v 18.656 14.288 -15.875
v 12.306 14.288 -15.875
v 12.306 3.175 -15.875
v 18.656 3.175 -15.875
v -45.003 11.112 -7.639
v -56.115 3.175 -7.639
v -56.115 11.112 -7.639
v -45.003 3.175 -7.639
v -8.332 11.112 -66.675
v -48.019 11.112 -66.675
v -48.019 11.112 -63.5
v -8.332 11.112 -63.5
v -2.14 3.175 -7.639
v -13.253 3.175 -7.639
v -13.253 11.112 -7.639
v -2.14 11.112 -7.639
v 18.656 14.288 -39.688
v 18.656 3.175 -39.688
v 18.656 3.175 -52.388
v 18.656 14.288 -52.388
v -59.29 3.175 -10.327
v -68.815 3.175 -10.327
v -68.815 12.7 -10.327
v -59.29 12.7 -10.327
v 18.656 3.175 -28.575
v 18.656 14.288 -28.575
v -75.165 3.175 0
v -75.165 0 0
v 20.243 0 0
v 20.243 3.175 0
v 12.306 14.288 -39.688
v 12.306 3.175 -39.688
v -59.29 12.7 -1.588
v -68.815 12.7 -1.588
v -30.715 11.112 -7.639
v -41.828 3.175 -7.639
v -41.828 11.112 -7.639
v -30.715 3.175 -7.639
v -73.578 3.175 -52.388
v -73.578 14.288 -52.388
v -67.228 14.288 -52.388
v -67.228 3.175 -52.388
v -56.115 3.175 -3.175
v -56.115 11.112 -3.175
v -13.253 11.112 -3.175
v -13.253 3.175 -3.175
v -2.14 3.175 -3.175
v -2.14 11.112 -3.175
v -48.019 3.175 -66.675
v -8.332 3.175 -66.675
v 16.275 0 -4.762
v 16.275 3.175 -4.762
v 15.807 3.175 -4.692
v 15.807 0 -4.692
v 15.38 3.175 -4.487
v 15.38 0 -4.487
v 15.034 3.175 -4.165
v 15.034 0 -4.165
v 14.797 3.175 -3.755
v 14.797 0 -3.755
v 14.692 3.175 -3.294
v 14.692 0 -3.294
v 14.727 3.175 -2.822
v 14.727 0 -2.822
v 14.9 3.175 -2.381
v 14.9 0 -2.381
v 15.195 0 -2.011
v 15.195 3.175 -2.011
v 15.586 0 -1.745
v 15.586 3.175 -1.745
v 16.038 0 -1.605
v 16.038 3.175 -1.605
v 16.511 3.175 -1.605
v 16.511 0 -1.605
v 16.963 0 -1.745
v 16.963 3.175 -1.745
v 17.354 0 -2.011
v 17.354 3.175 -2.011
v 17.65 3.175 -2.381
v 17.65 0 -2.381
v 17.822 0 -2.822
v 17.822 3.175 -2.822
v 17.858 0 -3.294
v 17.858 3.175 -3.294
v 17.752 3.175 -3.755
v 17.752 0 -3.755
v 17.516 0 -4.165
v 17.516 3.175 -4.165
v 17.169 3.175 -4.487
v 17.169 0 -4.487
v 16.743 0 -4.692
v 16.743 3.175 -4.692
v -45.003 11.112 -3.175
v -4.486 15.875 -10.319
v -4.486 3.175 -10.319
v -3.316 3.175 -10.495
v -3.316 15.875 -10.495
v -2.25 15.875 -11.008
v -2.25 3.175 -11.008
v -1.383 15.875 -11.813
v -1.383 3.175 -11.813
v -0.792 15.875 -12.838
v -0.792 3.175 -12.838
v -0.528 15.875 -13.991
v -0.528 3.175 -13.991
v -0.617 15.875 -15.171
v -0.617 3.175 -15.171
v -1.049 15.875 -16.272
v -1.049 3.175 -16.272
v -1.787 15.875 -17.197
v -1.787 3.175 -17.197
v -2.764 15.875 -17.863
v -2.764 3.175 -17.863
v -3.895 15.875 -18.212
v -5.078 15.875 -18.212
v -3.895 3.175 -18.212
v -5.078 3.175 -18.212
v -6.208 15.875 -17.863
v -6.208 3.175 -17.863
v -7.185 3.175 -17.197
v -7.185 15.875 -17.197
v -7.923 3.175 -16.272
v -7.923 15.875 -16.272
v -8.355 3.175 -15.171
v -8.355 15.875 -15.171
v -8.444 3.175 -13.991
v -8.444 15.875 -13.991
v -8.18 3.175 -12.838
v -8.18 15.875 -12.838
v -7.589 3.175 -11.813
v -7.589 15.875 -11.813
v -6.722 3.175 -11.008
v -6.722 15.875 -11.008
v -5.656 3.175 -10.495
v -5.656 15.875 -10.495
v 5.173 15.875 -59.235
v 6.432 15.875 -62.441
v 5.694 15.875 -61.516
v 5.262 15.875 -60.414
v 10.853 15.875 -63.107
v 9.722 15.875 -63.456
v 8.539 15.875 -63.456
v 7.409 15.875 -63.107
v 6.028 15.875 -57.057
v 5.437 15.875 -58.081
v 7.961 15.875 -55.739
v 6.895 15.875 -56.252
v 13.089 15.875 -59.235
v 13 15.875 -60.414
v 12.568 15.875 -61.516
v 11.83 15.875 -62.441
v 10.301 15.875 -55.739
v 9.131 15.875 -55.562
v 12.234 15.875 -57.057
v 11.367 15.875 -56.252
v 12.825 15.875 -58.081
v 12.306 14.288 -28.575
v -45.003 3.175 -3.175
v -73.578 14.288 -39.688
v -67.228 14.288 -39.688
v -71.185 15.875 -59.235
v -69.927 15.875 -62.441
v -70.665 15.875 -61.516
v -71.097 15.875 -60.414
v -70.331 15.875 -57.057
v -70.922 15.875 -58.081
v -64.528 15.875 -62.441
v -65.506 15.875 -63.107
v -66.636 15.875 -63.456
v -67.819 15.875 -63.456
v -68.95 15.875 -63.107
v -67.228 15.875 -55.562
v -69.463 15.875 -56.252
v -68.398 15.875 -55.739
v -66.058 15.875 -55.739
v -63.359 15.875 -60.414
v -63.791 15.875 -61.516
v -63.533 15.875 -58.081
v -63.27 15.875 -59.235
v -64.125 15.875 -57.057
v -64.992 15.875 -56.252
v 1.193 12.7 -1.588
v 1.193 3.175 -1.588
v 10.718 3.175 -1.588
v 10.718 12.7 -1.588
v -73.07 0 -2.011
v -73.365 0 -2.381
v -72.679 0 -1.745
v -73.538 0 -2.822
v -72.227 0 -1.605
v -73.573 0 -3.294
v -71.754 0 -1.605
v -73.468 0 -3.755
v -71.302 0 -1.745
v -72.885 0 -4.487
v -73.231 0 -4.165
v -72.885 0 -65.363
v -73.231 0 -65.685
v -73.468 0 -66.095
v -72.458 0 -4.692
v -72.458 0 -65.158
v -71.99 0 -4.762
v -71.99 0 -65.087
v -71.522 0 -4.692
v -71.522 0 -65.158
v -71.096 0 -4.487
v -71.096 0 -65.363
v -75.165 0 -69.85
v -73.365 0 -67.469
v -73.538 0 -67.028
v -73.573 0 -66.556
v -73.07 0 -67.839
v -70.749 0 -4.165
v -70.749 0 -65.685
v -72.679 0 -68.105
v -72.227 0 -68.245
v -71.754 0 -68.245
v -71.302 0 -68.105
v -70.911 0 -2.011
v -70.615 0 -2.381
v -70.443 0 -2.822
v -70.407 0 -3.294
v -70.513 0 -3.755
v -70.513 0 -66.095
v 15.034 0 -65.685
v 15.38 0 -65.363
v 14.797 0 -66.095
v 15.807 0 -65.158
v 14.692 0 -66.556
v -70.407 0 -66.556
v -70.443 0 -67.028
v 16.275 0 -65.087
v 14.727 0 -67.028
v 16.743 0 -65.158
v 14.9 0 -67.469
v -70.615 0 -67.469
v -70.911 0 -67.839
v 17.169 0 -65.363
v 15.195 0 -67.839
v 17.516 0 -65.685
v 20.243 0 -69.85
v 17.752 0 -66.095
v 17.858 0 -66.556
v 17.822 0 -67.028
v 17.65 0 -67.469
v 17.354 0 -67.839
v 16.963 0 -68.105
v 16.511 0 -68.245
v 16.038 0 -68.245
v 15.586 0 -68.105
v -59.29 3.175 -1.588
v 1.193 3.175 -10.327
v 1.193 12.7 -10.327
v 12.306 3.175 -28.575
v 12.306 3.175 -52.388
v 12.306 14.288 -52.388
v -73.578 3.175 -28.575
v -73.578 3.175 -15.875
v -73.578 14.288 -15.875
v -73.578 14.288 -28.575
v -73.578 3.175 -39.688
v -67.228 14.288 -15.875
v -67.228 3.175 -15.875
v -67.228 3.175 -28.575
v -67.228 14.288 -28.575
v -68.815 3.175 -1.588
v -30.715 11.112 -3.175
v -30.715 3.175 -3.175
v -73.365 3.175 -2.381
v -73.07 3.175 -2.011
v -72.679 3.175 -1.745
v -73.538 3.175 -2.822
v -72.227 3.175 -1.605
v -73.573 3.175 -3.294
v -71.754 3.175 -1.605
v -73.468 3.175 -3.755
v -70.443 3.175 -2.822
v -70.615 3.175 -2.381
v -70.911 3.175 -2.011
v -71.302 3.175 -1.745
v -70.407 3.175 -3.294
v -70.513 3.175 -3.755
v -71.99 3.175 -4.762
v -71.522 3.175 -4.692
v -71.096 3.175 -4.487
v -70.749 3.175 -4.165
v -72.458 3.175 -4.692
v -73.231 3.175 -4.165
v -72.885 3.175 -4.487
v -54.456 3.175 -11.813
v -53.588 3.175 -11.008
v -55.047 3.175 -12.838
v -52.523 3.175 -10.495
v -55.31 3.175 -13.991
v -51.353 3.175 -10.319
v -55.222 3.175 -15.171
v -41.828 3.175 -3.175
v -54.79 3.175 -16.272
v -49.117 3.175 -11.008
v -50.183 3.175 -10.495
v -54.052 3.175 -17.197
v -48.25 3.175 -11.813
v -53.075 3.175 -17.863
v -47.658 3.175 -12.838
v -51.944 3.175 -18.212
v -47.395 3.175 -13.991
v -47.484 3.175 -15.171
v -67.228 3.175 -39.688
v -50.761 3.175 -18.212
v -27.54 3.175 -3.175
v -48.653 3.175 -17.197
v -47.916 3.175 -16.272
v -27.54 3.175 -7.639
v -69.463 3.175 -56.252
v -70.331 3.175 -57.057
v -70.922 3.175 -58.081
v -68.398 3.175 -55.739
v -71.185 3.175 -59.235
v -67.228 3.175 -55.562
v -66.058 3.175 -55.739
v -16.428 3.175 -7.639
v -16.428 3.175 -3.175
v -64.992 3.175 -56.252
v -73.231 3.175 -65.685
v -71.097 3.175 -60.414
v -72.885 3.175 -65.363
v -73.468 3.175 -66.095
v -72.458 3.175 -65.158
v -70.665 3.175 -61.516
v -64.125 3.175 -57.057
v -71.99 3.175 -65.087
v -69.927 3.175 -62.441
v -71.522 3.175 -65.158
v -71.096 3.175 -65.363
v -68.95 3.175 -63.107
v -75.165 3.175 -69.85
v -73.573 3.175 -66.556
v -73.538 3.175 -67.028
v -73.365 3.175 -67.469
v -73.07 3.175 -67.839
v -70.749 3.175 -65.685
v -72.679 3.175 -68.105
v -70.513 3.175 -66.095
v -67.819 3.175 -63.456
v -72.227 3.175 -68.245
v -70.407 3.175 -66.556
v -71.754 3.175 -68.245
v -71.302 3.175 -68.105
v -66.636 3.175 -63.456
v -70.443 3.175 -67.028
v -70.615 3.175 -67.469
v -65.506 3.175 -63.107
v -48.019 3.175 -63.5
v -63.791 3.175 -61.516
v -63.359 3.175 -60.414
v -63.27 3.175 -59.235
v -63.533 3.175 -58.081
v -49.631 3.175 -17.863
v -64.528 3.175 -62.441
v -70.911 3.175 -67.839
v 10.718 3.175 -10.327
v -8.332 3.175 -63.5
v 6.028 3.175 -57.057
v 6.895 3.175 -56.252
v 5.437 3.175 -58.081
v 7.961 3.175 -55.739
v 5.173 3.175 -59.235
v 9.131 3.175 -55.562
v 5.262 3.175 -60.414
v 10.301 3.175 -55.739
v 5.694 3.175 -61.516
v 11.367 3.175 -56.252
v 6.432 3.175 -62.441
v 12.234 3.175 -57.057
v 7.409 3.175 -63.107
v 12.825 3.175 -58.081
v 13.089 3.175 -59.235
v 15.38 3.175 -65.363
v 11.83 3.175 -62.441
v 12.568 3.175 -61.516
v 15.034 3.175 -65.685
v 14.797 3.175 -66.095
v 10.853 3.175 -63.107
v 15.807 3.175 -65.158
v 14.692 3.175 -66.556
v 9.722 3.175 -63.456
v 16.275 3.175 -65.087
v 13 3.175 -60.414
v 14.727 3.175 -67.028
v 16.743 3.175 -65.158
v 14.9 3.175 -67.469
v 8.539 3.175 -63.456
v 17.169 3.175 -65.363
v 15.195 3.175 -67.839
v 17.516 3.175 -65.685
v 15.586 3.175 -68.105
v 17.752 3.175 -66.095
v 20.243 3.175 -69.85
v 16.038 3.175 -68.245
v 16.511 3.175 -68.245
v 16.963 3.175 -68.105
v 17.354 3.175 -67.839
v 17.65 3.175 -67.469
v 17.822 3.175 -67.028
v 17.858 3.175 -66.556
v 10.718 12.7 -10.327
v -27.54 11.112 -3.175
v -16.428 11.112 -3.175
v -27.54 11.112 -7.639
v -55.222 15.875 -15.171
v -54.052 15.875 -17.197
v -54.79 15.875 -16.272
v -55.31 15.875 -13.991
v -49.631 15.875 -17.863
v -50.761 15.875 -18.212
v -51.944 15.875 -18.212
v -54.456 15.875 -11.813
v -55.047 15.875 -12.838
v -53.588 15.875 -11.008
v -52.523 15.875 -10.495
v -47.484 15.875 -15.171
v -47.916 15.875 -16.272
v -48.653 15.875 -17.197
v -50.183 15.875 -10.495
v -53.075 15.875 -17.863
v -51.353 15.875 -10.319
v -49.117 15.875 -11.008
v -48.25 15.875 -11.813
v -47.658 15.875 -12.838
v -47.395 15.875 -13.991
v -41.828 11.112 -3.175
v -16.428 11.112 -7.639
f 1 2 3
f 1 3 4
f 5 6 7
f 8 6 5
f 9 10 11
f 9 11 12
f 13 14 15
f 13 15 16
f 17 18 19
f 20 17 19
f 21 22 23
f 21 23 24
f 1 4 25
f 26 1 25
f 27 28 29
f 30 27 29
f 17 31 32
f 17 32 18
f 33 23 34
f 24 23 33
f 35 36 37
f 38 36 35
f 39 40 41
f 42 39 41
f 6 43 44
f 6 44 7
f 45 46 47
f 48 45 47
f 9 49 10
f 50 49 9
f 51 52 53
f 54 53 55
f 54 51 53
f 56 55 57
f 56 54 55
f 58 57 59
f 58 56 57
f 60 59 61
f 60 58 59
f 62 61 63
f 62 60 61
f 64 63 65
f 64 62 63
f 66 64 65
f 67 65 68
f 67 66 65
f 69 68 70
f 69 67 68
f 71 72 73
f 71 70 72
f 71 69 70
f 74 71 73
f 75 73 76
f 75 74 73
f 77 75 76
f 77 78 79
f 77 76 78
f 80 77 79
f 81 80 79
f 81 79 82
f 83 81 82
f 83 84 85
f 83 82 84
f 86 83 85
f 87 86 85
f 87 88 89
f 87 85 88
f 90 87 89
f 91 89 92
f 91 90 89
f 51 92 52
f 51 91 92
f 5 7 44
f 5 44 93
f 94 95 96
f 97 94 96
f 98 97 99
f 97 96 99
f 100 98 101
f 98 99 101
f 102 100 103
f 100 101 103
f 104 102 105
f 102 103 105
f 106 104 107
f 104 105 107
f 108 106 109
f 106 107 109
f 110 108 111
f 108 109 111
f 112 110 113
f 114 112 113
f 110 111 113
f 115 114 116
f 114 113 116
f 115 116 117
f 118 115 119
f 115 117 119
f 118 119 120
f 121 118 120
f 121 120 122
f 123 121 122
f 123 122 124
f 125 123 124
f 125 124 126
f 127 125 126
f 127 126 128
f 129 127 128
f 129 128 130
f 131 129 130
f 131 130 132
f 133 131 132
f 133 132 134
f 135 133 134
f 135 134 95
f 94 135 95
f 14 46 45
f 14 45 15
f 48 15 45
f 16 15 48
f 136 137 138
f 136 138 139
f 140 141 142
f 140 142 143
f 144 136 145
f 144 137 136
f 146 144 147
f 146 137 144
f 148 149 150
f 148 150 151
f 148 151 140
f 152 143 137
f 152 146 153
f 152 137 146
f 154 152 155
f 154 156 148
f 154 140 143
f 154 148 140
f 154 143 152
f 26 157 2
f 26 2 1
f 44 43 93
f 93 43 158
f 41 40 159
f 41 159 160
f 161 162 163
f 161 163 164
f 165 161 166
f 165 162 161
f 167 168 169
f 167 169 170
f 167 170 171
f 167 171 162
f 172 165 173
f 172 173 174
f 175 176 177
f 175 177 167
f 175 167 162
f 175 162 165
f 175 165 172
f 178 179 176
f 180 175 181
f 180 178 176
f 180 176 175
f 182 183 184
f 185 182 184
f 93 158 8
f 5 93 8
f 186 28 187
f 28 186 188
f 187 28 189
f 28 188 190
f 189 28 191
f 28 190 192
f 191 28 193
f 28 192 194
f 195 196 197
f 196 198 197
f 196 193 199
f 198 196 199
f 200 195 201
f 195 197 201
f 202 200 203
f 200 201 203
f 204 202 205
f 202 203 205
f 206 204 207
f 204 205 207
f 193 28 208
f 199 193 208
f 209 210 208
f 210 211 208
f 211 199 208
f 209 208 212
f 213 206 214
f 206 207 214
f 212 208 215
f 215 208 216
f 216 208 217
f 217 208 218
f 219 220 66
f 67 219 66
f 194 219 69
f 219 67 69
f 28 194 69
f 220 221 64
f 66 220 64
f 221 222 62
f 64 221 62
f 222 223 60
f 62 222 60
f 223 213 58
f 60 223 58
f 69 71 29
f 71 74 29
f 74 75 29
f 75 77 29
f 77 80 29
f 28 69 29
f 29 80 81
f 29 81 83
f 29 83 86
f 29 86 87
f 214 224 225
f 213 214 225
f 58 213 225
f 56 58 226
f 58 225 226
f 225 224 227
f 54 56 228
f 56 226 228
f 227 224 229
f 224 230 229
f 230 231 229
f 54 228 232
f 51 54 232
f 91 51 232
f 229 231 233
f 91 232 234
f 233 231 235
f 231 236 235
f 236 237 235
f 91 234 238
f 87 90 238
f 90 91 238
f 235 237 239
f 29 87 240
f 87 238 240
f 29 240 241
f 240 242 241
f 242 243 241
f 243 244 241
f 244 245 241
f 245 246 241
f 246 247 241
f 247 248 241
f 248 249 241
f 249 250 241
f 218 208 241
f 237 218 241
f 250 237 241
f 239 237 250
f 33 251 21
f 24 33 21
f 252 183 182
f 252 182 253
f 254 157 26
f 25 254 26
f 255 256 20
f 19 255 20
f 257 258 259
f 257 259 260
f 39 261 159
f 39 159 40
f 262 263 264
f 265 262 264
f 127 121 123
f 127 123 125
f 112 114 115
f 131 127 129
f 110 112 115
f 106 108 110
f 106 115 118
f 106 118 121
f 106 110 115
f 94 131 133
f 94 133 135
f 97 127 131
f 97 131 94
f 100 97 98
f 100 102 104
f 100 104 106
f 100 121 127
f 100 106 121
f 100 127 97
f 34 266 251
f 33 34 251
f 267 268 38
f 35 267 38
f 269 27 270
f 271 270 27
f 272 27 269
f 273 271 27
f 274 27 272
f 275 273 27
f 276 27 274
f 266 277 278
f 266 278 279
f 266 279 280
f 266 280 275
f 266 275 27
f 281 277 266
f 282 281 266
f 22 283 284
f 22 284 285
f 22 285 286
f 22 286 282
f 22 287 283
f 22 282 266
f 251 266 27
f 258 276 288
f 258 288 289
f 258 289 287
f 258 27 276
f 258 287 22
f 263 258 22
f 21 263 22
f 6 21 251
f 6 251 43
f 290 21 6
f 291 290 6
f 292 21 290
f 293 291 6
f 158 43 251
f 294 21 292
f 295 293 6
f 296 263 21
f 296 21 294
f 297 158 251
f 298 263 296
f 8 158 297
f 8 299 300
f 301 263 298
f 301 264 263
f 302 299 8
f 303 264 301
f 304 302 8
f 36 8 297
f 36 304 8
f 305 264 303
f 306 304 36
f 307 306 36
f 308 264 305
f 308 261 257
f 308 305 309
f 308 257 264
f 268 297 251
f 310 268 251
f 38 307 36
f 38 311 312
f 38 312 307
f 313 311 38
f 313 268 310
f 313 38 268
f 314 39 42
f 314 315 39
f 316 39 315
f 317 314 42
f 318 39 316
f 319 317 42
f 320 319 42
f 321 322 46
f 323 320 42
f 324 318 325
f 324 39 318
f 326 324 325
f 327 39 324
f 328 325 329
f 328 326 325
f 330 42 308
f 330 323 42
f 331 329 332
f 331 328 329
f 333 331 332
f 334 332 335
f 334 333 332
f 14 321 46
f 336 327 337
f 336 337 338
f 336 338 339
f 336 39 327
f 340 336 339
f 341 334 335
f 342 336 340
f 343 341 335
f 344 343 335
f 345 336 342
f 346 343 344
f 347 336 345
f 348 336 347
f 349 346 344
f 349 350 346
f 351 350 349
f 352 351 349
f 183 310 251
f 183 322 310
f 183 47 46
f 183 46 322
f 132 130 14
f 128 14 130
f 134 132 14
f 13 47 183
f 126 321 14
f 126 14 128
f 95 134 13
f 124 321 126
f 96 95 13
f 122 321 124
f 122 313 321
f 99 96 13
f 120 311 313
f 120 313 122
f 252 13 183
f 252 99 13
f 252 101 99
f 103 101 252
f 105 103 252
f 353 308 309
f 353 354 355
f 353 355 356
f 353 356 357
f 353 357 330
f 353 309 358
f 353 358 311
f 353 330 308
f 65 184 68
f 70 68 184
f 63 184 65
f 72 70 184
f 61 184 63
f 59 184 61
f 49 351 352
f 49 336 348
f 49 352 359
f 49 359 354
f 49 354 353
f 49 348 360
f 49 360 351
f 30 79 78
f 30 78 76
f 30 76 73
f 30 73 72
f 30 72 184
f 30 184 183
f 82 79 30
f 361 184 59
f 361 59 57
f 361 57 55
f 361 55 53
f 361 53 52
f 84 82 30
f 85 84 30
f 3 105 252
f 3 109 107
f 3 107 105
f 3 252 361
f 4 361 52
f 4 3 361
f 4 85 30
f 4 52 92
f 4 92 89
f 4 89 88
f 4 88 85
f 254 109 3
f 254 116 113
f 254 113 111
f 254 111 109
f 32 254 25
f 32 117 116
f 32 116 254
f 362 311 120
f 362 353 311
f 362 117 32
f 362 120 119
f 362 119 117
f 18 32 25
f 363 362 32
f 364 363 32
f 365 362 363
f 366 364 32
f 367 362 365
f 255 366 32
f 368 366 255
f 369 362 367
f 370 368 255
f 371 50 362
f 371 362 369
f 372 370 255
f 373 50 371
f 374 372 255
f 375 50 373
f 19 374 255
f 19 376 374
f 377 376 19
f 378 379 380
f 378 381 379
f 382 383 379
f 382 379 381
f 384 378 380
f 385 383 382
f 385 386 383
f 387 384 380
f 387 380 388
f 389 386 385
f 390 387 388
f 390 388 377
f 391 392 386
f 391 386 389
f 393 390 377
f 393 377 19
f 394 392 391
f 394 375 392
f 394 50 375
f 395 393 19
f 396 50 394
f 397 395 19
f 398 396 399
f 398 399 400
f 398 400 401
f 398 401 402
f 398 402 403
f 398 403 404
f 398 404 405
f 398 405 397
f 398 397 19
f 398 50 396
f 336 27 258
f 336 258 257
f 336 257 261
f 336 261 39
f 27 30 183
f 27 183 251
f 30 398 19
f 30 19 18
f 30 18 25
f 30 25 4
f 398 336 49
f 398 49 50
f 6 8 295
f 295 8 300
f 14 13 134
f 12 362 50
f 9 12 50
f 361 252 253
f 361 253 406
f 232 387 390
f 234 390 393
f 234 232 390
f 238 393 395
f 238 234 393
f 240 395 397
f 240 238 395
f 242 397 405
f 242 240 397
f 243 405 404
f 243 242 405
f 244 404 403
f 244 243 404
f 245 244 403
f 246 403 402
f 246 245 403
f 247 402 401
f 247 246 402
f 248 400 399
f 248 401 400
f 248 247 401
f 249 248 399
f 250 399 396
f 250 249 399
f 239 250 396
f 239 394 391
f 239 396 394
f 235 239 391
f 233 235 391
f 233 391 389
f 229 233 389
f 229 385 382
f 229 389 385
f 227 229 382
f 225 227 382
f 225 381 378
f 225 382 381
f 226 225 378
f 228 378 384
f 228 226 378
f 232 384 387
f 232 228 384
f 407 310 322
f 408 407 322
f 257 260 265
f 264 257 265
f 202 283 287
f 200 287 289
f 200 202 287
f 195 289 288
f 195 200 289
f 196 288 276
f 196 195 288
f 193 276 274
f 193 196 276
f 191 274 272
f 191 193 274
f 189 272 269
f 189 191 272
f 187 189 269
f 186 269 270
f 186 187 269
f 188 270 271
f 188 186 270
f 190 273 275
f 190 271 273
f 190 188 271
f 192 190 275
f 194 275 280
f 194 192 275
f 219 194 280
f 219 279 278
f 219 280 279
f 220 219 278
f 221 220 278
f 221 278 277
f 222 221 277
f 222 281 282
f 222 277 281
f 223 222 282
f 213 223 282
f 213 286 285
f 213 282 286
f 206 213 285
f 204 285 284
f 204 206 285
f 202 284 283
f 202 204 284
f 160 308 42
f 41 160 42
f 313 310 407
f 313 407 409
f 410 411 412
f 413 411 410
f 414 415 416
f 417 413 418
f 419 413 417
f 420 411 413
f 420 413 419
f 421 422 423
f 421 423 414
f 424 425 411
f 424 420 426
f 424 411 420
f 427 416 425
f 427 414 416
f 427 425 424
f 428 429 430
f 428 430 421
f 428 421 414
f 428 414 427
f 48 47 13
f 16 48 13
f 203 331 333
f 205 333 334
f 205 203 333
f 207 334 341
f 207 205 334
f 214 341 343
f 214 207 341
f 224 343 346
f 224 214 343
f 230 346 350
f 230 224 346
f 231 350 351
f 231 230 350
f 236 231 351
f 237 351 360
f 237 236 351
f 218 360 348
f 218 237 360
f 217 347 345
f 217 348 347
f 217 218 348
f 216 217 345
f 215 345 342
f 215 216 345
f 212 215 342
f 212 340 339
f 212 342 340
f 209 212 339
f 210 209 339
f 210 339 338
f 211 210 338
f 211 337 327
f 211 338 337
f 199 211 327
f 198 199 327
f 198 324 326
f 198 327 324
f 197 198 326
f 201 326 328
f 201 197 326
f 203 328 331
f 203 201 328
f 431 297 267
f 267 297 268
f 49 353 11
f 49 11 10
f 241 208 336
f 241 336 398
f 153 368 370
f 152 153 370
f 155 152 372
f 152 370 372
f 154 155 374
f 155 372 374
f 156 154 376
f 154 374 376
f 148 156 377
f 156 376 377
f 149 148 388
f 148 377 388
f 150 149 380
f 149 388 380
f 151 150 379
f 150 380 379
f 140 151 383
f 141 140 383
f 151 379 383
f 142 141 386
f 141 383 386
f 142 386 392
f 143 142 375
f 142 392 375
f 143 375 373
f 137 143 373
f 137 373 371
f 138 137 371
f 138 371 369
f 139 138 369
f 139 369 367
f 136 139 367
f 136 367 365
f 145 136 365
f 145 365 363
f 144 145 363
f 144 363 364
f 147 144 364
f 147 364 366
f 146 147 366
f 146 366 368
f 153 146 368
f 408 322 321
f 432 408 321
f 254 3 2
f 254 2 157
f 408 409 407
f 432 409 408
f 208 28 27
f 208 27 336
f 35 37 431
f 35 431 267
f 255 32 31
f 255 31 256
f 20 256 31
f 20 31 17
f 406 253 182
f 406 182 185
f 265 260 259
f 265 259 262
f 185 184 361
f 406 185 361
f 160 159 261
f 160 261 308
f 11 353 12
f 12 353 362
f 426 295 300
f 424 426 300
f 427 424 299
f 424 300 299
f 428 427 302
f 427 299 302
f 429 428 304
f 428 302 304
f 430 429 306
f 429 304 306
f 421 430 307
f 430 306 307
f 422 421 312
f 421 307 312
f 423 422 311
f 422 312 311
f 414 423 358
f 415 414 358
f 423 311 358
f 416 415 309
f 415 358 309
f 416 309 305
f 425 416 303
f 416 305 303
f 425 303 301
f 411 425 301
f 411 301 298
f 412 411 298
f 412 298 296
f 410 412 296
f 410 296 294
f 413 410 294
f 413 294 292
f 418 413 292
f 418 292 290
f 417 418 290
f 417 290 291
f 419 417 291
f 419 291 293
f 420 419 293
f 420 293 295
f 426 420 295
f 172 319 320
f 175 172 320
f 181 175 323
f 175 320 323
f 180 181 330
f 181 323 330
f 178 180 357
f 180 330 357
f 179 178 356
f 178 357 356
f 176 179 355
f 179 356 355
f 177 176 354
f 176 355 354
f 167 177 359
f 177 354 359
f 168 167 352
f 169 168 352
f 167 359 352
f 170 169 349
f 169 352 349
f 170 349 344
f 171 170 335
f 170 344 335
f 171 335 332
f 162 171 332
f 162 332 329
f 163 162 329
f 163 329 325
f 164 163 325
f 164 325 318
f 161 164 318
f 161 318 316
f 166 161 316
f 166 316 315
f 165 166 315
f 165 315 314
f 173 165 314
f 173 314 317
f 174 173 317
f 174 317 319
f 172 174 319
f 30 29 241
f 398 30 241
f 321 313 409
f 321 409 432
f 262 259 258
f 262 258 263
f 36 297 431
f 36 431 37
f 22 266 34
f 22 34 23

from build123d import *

# Parameters (mm, degrees)
SKETCH1_W           = 95.40875
SKETCH1_H           = 69.85
BOSS_EXTRUDE1_DEPTH = 3.175
SKETCH1_4_R         = 3.96875
BOSS_EXTRUDE2_DEPTH = 15.875
SKETCH1_5_W         = 6.35
SKETCH1_5_H         = 12.7
BOSS_EXTRUDE3_DEPTH = 14.2875
SKETCH1_6_W         = 39.6875
SKETCH1_6_H         = 3.175
BOSS_EXTRUDE4_DEPTH = 11.1125
SKETCH1_8_R         = 1.5875
CUT_EXTRUDE4_DEPTH  = 104.830931221
SKETCH1_9_W         = 11.1125
SKETCH1_9_H         = 4.464487979
BOSS_EXTRUDE5_DEPTH = 11.1125
SKETCH1_10_W        = 9.525
SKETCH1_10_H        = 8.739789678
BOSS_EXTRUDE6_DEPTH = 12.7


with BuildPart() as part:
    # Sketch1 → Boss-Extrude1 (new body)
    with BuildSketch(Plane(origin=(0, 0, 0), x_dir=(1, 0, 0), z_dir=(0, 1, 0))):
        with Locations((-27.460937167, 34.925)):
            Rectangle(SKETCH1_W, SKETCH1_H)
    extrude(amount=BOSS_EXTRUDE1_DEPTH)

    # Sketch1<4> → Boss-Extrude2 (add)
    with BuildSketch(Plane(origin=(0, 0, 0), x_dir=(1, 0, 0), z_dir=(0, 1, 0))):
        with Locations(Location((-51.352812167, 14.2875, 0), (0, 0, 270))):
            Circle(SKETCH1_4_R)
        with Locations(Location((-4.486033595, 14.2875, 0), (0, 0, 270))):
            Circle(SKETCH1_4_R)
        with Locations(Location((9.130937833, 59.53125, 0), (0, 0, 270))):
            Circle(SKETCH1_4_R)
        with Locations(Location((-67.227812167, 59.53125, 0), (0, 0, 270))):
            Circle(SKETCH1_4_R)
    extrude(amount=BOSS_EXTRUDE2_DEPTH)

    # Sketch1<5> → Boss-Extrude3 (add)
    with BuildSketch(Plane(origin=(0, 0, 0), x_dir=(1, 0, 0), z_dir=(0, 1, 0))):
        with Locations((-70.402812167, 46.0375)):
            Rectangle(SKETCH1_5_W, SKETCH1_5_H)
        with Locations((-70.402812167, 22.225)):
            Rectangle(SKETCH1_5_W, SKETCH1_5_H)
        with Locations((15.480937833, 22.225)):
            Rectangle(SKETCH1_5_W, SKETCH1_5_H)
        with Locations((15.480937833, 46.0375)):
            Rectangle(SKETCH1_5_W, SKETCH1_5_H)
    extrude(amount=BOSS_EXTRUDE3_DEPTH)

    # Sketch1<6> → Boss-Extrude4 (add)
    with BuildSketch(Plane(origin=(0, 0, 0), x_dir=(1, 0, 0), z_dir=(0, 1, 0))):
        with Locations((-28.175312167, 65.0875)):
            Rectangle(SKETCH1_6_W, SKETCH1_6_H)
    extrude(amount=BOSS_EXTRUDE4_DEPTH)

    # Sketch1<8> → Cut-Extrude4 (cut, through all)
    with BuildSketch(Plane(origin=(0, 0, 0), x_dir=(1, 0, 0), z_dir=(0, 1, 0))):
        with Locations(Location((-71.990312167, 66.675, 0), (0, 0, 270))):
            Circle(SKETCH1_8_R)
        with Locations(Location((16.274687833, 3.175, 0), (0, 0, 90))):
            Circle(SKETCH1_8_R)
        with Locations(Location((16.274687833, 66.675, 0), (0, 0, 270))):
            Circle(SKETCH1_8_R)
        with Locations(Location((-71.990312167, 3.175, 0), (0, 0, 90))):
            Circle(SKETCH1_8_R)
    extrude(amount=CUT_EXTRUDE4_DEPTH, mode=Mode.SUBTRACT)

    # Sketch1<9> → Boss-Extrude5 (add)
    with BuildSketch(Plane(origin=(0, 0, 0), x_dir=(1, 0, 0), z_dir=(0, 1, 0))):
        with Locations((-36.271562167, 5.40724399)):
            Rectangle(SKETCH1_9_W, SKETCH1_9_H)
        with Locations((-21.984062167, 5.40724399)):
            Rectangle(SKETCH1_9_W, SKETCH1_9_H)
        with Locations((-7.696562167, 5.40724399)):
            Rectangle(SKETCH1_9_W, SKETCH1_9_H)
        with Locations((-50.559062167, 5.40724399)):
            Rectangle(SKETCH1_9_W, SKETCH1_9_H)
    extrude(amount=BOSS_EXTRUDE5_DEPTH)

    # Sketch1<10> → Boss-Extrude6 (add)
    with BuildSketch(Plane(origin=(0, 0, 0), x_dir=(1, 0, 0), z_dir=(0, 1, 0))):
        with Locations((-64.052812167, 5.957394839)):
            Rectangle(SKETCH1_10_W, SKETCH1_10_H)
        with Locations((5.955937833, 5.957394839)):
            Rectangle(SKETCH1_10_W, SKETCH1_10_H)
    extrude(amount=BOSS_EXTRUDE6_DEPTH)


solid = part.part
